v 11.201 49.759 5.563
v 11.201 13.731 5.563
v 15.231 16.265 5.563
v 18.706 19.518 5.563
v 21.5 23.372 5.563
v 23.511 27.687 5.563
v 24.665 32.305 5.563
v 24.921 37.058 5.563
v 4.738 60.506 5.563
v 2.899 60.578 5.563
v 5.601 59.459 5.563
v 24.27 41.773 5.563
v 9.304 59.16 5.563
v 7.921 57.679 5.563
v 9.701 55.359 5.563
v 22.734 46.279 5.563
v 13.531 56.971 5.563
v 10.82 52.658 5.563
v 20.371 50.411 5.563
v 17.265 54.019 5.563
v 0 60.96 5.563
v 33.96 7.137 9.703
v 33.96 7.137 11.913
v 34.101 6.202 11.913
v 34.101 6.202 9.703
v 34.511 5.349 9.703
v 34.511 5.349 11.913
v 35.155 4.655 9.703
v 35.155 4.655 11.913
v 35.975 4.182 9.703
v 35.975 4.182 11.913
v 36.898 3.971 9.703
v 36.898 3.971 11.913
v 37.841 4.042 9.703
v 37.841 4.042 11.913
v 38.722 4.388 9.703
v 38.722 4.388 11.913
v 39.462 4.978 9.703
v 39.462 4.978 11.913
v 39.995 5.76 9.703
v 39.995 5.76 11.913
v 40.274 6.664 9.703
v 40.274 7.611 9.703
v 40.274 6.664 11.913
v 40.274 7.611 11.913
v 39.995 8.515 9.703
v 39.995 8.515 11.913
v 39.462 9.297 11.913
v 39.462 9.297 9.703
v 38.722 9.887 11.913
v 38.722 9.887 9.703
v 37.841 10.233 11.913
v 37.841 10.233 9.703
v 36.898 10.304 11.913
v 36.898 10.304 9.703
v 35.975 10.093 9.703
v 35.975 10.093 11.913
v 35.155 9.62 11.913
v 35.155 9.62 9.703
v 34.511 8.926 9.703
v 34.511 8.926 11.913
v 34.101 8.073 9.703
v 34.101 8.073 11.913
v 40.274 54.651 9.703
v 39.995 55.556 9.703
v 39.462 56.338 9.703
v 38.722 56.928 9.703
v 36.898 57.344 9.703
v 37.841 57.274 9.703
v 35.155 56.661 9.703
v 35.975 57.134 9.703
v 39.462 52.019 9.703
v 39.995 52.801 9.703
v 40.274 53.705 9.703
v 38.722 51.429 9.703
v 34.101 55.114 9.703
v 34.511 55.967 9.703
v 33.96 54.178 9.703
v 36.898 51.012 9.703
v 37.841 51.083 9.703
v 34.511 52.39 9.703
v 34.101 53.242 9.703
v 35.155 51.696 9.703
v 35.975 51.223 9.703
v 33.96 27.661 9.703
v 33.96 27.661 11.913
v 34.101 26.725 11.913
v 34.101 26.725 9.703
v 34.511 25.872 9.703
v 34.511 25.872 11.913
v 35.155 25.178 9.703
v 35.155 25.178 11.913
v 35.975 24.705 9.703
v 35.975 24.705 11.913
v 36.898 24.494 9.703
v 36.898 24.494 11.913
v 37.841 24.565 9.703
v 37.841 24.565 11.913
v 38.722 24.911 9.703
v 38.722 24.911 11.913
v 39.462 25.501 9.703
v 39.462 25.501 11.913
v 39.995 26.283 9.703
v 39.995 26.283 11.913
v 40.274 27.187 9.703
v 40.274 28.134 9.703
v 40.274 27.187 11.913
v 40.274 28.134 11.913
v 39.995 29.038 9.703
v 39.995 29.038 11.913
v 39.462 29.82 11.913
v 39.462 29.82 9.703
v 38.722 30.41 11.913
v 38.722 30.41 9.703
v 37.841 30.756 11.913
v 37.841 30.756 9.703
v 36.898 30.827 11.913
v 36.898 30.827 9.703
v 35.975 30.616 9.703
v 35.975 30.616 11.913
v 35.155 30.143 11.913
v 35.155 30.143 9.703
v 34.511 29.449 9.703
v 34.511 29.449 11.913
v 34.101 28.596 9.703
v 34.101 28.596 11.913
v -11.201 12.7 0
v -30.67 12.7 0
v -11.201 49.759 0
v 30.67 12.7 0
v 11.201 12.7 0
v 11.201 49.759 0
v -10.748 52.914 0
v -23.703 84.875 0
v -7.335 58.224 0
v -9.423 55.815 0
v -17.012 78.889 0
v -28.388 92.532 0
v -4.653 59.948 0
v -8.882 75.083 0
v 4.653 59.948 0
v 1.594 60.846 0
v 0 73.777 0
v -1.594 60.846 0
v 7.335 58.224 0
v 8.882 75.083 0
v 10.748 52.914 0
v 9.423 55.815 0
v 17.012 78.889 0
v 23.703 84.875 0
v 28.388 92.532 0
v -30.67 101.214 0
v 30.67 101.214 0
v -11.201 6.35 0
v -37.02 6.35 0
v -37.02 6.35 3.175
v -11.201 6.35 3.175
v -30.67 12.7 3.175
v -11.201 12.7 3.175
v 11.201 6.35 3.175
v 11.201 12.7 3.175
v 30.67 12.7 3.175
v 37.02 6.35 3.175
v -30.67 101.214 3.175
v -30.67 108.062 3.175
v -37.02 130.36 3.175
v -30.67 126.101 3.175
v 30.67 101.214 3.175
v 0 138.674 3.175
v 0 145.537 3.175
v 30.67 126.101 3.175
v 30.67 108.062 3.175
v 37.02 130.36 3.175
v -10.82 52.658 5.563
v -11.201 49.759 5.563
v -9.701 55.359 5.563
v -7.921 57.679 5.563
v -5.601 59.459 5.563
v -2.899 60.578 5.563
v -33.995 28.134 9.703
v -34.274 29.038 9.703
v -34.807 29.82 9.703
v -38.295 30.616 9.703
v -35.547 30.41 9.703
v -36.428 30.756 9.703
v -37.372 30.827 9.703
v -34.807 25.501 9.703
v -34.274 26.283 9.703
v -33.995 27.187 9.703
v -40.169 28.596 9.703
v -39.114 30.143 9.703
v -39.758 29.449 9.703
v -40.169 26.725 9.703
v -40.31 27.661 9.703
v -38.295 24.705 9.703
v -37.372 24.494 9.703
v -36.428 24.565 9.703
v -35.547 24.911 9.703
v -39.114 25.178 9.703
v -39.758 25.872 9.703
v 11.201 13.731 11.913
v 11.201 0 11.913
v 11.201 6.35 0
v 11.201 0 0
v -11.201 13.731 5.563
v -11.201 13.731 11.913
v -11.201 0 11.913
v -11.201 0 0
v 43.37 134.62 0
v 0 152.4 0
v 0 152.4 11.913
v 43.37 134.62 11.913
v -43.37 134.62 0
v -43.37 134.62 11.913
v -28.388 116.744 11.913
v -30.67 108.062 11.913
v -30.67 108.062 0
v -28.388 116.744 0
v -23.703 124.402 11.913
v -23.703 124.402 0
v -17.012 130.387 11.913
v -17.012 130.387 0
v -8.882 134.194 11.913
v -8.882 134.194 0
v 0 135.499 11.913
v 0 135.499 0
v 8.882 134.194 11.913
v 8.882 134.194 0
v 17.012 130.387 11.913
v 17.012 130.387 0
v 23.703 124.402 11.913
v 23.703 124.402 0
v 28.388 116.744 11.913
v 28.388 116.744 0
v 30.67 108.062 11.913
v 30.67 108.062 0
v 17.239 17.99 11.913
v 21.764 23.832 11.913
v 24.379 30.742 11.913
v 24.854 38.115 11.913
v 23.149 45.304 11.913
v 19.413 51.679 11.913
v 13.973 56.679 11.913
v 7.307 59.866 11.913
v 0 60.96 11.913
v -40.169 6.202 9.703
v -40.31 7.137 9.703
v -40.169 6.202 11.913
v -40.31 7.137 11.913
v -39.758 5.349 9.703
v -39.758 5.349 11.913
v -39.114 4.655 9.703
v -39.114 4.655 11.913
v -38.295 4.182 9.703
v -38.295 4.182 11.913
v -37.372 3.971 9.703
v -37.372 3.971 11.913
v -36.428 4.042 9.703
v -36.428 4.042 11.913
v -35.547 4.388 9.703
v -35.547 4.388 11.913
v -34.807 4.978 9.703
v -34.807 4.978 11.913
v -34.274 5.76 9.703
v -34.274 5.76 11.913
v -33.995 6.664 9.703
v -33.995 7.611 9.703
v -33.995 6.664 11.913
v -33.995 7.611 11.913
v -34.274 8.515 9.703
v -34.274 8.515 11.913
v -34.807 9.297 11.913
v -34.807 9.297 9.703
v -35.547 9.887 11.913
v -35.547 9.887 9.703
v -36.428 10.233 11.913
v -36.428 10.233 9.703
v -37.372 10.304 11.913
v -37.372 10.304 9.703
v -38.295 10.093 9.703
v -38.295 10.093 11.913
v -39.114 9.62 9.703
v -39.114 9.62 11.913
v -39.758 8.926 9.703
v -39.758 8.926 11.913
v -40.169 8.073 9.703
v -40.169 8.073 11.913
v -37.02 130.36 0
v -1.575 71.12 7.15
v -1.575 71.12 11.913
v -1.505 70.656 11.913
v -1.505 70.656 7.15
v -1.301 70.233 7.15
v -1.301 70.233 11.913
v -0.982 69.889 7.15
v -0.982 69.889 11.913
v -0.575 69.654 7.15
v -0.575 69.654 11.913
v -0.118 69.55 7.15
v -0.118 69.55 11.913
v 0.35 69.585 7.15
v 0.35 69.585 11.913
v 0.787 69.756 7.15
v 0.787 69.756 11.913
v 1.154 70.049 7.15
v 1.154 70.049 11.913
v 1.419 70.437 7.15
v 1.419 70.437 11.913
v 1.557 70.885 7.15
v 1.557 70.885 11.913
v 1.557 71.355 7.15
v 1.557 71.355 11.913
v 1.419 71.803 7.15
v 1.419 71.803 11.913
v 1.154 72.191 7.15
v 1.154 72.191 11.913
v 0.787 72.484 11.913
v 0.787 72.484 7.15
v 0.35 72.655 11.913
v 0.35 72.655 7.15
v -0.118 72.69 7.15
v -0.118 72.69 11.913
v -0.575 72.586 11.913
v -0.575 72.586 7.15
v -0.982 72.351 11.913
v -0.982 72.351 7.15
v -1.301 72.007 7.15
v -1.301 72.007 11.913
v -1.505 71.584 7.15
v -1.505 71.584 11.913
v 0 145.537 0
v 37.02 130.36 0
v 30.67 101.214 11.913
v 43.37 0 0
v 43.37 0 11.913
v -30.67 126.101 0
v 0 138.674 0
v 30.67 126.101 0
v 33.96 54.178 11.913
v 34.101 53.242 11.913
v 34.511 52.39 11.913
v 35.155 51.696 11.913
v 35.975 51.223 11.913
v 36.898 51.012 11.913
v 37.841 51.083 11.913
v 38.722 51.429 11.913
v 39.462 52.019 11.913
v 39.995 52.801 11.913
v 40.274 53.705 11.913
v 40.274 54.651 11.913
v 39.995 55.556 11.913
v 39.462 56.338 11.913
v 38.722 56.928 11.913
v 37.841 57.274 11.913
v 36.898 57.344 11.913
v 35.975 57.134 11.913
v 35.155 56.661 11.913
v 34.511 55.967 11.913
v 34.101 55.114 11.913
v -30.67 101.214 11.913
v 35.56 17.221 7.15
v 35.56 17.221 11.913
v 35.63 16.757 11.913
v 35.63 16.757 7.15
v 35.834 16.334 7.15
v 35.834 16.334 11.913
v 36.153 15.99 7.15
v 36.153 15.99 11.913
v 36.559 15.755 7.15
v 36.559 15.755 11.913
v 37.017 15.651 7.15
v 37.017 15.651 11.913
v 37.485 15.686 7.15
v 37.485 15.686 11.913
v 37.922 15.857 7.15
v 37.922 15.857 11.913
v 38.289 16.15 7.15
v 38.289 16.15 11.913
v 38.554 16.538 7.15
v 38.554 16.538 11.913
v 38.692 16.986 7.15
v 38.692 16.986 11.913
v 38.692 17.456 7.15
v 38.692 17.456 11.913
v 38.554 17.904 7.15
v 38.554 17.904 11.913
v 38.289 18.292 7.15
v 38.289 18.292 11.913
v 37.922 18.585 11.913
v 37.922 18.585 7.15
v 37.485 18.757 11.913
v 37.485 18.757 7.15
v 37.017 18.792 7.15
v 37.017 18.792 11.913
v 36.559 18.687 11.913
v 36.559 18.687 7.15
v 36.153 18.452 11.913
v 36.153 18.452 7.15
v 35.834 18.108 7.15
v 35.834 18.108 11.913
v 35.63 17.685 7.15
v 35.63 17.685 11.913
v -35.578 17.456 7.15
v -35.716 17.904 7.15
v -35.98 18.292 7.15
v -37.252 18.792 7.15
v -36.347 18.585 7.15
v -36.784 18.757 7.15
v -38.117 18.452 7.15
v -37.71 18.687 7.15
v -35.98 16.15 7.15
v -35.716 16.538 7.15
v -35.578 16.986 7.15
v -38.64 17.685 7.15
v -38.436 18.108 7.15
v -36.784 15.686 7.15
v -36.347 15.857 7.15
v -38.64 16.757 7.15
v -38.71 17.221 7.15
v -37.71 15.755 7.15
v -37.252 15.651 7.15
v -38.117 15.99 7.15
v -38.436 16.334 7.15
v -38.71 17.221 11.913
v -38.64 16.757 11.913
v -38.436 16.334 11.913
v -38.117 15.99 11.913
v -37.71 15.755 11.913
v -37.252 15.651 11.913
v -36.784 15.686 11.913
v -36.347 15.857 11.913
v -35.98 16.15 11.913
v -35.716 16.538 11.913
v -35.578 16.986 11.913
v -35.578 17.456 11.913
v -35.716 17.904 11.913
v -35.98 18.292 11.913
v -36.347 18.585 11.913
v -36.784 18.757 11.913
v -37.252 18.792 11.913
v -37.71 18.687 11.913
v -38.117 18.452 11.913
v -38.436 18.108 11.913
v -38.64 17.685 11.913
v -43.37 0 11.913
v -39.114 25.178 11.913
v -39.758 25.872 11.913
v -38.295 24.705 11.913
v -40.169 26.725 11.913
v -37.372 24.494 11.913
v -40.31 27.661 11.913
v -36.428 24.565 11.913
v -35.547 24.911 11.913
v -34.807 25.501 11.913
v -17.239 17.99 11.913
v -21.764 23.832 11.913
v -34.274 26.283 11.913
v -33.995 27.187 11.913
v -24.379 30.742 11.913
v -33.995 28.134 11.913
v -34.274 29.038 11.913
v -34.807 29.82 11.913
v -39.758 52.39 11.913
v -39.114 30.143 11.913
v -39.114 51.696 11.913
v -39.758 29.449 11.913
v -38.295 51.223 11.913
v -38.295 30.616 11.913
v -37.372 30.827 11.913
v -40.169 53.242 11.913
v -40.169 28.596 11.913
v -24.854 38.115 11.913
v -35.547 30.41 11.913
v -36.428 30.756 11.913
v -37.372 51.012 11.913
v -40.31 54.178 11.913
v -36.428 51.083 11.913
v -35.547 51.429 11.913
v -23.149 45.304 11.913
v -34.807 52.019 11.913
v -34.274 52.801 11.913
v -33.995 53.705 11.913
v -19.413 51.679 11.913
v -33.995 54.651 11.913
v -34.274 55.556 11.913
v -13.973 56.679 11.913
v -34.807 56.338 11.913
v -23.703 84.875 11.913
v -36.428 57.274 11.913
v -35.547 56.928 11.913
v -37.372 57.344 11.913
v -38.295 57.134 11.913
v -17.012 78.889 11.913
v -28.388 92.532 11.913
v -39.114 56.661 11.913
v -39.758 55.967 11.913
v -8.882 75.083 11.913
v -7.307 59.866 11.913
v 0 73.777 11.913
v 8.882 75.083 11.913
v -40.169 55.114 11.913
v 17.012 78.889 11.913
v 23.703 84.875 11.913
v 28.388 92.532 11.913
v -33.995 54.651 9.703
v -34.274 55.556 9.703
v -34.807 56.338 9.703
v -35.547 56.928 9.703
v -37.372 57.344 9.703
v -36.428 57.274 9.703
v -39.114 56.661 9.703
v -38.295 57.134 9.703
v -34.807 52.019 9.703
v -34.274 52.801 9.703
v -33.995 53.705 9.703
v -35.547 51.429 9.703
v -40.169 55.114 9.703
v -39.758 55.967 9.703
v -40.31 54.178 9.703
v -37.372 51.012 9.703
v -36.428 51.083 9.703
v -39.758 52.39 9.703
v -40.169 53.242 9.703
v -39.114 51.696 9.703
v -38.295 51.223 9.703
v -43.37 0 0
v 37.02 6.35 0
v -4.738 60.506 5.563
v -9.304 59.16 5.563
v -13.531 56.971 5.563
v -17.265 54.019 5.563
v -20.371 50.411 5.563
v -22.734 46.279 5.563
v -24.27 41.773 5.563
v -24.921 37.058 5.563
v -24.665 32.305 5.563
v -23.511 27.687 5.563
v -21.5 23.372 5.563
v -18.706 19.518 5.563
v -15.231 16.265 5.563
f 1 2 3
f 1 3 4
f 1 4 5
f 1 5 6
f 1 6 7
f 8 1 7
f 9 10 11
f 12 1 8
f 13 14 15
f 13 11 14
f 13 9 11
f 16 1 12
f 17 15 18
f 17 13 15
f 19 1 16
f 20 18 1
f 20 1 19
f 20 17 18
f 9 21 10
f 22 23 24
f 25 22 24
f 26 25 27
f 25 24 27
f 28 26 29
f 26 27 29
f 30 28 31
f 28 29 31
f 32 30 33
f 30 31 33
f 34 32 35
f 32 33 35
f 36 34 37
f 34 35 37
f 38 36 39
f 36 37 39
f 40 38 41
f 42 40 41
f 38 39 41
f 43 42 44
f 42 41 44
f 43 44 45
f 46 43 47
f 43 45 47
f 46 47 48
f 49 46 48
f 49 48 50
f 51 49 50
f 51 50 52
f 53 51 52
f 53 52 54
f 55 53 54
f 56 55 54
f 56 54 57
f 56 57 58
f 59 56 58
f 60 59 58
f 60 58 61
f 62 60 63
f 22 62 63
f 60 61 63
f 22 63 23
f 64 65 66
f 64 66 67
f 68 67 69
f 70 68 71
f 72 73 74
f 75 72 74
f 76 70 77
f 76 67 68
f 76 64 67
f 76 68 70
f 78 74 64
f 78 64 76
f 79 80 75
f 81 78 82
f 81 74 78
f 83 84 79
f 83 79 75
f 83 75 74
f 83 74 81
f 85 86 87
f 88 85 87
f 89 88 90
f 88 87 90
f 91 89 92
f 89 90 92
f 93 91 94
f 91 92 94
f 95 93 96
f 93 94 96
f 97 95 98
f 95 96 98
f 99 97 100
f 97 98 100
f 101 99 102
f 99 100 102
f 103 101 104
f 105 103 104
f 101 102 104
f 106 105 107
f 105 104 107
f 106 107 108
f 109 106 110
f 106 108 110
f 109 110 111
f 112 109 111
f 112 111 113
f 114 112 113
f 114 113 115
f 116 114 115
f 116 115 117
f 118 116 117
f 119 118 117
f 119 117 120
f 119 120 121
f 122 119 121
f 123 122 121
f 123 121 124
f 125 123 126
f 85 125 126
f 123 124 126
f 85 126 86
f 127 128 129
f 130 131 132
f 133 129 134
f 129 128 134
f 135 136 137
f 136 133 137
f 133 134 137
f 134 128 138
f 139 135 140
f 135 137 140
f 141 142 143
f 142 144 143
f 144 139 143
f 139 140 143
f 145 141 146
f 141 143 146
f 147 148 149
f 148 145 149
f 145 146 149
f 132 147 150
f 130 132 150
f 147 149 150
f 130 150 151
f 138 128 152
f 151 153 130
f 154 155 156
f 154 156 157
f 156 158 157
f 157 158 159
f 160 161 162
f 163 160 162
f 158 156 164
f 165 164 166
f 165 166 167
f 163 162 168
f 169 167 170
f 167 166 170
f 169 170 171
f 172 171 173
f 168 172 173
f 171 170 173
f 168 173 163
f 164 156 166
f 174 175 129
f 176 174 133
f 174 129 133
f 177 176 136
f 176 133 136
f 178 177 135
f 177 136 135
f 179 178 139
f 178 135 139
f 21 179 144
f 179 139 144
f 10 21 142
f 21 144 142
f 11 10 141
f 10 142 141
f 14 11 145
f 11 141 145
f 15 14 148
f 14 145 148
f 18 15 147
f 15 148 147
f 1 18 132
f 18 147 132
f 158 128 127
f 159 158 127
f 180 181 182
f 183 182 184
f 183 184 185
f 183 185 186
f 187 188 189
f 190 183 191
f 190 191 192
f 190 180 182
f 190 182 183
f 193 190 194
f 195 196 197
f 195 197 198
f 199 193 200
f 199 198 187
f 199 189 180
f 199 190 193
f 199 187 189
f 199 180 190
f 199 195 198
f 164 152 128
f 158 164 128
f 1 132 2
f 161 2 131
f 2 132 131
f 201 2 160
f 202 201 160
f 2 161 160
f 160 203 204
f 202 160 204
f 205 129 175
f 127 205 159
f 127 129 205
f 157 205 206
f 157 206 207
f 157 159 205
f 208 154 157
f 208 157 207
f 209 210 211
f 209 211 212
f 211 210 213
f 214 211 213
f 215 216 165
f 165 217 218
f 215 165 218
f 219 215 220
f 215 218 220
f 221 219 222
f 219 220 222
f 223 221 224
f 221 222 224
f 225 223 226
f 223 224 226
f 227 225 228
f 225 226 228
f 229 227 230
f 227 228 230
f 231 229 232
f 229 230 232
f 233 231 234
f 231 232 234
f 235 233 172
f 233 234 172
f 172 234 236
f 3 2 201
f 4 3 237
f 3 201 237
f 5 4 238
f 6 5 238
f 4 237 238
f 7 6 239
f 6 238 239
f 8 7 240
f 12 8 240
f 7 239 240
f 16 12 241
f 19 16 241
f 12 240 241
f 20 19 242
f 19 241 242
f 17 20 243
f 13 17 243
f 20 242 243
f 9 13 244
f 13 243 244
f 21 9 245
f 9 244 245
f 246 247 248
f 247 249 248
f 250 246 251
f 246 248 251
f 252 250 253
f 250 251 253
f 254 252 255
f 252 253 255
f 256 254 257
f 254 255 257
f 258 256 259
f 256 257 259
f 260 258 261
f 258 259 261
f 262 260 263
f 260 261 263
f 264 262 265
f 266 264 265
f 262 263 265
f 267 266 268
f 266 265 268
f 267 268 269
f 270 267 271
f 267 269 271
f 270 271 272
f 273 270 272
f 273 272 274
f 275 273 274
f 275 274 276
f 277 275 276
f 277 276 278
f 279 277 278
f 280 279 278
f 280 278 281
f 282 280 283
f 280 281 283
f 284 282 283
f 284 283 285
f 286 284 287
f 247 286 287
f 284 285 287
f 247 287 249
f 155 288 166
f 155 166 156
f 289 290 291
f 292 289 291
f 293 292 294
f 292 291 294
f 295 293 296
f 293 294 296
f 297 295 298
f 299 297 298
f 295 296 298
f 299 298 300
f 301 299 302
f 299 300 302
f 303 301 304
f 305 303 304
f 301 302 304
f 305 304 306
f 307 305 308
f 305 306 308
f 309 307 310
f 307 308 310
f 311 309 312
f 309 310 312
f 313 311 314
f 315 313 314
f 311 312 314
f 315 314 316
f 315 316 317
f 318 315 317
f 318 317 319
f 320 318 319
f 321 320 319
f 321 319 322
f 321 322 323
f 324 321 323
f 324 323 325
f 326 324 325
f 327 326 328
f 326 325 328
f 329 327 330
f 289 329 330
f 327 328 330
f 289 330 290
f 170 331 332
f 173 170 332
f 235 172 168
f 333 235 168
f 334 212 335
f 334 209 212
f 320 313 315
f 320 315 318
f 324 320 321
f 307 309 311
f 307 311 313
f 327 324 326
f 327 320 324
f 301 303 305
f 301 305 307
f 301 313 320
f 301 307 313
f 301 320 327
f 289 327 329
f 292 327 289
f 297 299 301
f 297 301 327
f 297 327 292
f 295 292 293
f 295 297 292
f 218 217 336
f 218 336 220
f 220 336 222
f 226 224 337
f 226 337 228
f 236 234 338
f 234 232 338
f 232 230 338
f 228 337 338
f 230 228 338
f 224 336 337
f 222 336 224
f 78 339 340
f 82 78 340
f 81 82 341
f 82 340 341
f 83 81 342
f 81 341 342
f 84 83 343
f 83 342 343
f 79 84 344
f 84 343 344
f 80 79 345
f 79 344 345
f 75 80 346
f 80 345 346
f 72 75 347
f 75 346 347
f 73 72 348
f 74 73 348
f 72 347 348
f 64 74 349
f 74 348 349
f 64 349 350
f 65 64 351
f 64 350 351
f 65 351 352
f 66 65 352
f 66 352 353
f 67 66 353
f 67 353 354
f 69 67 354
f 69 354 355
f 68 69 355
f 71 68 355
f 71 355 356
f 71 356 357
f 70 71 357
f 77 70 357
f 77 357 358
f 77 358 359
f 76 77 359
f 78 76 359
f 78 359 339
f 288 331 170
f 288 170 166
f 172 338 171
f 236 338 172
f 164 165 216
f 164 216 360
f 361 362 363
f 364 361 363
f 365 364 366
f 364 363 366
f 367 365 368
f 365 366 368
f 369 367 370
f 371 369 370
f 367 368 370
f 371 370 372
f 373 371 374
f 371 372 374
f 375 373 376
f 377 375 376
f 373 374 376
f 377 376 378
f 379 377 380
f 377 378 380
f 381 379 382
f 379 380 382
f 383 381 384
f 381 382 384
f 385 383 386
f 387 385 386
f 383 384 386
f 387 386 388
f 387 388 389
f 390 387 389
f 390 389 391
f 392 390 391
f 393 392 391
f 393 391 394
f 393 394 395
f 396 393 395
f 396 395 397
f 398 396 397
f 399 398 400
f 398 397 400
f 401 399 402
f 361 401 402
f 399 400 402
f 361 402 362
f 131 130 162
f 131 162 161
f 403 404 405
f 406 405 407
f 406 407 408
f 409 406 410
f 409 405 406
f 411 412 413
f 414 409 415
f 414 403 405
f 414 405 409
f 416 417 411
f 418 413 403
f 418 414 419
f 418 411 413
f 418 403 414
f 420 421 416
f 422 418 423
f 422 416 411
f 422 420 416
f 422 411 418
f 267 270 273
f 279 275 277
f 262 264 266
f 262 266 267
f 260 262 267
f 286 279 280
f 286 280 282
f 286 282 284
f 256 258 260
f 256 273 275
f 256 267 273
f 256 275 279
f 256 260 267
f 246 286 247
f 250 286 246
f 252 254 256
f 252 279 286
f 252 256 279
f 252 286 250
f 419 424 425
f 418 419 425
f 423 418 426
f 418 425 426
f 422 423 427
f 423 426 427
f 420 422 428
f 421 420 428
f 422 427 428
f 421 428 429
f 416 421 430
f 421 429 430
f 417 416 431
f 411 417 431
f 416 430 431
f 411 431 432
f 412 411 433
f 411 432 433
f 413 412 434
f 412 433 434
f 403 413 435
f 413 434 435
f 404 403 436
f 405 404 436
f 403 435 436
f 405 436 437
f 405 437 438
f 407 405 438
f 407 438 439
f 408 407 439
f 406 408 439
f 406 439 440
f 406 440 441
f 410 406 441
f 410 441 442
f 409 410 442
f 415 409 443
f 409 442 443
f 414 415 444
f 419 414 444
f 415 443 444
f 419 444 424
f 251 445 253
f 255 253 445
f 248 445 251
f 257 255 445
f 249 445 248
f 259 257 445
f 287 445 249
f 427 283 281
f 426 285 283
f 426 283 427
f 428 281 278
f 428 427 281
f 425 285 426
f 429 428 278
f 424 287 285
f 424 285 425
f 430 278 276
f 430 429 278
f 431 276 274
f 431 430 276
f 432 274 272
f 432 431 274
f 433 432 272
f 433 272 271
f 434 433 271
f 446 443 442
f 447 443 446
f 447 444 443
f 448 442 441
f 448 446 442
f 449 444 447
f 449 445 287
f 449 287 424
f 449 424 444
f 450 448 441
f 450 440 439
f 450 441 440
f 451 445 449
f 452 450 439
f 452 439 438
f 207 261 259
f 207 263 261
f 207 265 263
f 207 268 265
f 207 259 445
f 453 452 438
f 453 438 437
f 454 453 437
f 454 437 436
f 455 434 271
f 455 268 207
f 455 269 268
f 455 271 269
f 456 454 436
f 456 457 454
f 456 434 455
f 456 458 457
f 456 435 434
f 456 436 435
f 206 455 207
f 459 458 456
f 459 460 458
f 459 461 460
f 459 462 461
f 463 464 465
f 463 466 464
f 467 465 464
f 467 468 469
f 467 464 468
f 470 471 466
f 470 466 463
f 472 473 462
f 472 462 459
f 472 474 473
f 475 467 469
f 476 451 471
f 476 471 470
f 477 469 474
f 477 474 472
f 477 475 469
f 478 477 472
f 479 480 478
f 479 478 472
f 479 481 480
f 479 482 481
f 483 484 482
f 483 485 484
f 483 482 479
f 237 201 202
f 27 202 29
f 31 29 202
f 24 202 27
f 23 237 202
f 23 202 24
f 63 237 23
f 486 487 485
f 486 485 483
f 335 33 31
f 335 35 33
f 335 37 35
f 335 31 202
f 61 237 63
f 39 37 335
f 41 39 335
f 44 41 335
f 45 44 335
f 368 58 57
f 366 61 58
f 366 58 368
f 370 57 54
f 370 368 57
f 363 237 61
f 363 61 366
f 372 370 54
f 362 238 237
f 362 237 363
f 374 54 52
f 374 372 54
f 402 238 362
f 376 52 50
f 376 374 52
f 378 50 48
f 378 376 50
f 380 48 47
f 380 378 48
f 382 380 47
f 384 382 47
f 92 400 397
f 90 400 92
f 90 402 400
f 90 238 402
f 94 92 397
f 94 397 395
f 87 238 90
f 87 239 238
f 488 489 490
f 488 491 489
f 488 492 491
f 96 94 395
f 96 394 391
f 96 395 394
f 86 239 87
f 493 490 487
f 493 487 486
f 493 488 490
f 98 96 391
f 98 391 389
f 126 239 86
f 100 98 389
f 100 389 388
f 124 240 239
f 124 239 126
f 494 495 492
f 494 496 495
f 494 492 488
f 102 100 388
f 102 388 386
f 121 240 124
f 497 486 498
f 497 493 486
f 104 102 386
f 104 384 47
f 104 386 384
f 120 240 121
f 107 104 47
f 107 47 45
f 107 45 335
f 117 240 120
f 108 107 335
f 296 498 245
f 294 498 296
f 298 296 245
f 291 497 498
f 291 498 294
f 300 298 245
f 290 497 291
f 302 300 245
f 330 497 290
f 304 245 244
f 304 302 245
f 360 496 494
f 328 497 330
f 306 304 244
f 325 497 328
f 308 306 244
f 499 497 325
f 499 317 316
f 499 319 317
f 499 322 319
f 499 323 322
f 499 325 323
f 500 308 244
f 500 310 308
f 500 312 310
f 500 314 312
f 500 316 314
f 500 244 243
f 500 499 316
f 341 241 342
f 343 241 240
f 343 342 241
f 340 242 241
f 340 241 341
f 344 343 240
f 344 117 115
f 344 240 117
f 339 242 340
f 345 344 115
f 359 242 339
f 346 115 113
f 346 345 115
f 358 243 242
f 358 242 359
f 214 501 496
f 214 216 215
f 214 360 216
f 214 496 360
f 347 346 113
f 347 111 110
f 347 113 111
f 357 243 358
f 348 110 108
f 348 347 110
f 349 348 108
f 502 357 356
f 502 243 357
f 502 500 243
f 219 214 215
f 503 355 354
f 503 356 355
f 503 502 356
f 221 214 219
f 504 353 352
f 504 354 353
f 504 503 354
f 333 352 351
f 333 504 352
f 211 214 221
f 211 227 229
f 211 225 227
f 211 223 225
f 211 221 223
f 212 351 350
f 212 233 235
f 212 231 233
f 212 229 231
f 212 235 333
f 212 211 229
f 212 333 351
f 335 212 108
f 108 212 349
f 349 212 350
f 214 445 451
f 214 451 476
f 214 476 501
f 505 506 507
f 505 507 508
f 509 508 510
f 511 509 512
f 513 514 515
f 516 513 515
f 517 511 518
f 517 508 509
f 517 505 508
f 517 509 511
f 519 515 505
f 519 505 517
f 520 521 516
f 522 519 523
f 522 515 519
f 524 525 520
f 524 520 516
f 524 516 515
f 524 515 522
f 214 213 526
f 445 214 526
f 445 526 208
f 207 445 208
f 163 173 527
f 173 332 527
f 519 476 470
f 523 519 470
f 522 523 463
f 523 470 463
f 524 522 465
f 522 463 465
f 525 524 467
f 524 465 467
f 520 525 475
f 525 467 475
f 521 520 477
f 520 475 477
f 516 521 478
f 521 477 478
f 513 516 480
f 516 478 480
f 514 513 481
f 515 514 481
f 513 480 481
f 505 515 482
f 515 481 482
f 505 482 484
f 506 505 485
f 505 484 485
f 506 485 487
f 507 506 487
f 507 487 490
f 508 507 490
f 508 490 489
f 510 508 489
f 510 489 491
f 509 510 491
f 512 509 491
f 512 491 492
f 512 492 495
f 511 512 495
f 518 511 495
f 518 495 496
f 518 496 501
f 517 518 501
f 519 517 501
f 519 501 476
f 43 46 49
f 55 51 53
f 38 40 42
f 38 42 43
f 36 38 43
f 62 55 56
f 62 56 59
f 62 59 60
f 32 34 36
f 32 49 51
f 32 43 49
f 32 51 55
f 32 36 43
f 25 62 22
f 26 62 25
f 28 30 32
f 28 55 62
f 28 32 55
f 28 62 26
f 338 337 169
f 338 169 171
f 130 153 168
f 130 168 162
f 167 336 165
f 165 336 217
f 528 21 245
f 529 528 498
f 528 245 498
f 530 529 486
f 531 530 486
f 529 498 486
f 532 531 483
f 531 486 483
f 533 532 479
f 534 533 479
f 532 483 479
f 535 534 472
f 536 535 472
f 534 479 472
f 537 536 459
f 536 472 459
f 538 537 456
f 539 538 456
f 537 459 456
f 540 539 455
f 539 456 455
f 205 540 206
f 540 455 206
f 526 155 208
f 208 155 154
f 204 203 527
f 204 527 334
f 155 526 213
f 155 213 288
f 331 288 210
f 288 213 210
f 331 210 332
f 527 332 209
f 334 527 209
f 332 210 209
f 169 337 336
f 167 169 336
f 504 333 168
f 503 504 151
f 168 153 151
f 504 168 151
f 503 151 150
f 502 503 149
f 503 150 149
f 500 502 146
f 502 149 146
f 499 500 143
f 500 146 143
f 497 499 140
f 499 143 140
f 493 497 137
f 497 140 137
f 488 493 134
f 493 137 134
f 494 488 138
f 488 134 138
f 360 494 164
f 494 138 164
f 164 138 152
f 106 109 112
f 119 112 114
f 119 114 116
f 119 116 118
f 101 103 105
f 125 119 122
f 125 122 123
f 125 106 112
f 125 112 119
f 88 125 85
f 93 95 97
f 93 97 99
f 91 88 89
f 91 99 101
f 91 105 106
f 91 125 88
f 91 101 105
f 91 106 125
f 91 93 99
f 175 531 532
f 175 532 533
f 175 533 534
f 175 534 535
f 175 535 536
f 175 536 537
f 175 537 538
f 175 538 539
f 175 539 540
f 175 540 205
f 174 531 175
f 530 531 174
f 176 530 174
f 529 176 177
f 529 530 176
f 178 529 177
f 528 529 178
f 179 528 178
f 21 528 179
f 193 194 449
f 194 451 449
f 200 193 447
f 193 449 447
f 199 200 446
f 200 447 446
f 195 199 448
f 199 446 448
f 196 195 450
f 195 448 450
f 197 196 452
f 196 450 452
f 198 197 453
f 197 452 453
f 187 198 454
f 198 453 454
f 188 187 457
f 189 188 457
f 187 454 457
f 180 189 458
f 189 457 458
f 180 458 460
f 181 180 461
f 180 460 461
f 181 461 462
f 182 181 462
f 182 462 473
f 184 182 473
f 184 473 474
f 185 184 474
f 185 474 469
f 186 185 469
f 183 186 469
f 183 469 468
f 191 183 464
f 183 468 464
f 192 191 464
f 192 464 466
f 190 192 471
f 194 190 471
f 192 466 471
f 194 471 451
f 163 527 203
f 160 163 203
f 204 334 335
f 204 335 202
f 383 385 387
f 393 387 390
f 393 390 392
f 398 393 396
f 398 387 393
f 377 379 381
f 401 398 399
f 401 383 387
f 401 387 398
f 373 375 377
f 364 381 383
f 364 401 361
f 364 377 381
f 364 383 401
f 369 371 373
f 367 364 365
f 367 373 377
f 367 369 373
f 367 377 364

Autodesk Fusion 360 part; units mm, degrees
sketch "Sketch1" plane through (0, 0, 0) normal (0, 0, 1) x (1, 0, 0)
  line L0 (0, 0) -> (0, 152.4) construction
  line L1 (0, 152.4) -> (-43.3705, 134.62)
  line L2 (-43.3705, 134.62) -> (-43.3705, 0)
  line L3 (-43.3705, 0) -> (0, 0)
  line L4 (-11.2014, 49.7586) -> (-11.2014, 0)
  arc A0 (0, 60.96) -> (-11.2014, 49.7586) centre (0, 49.7586) ccw
  arc A1 (0, 60.96) -> (-11.2014, 13.7311) centre (0, 36.0172) ccw
  line L5 (0, 145.5371) -> (-37.0205, 130.3603)
  line L6 (-37.0205, 130.3603) -> (-37.0205, 6.35)
  line L7 (-37.0205, 6.35) -> (-11.2014, 6.35)
  line L8 (0, 138.6742) -> (-30.6705, 126.1007)
  line L9 (-30.6705, 126.1007) -> (-30.6705, 12.7)
  line L10 (-30.6705, 12.7) -> (-11.2014, 12.7)
  line L11 (30.6705, 12.7) -> (11.2014, 12.7)
  line L12 (37.0205, 130.3603) -> (37.0205, 6.35)
  line L13 (0, 145.5371) -> (37.0205, 130.3603)
  line L14 (0, 138.6742) -> (30.6705, 126.1007)
  line L15 (37.0205, 6.35) -> (11.2014, 6.35)
  arc A2 (11.2014, 49.7586) -> (0, 60.96) centre (0, 49.7586) ccw
  line L16 (11.2014, 49.7586) -> (11.2014, 0)
  line L17 (43.3705, 134.62) -> (43.3705, 0)
  line L18 (30.6705, 126.1007) -> (30.6705, 12.7)
  arc A3 (11.2014, 13.7311) -> (0, 60.96) centre (0, 36.0172) ccw
  line L19 (43.3705, 0) -> (0, 0)
  line L20 (0, 152.4) -> (43.3705, 134.62)
  circle A4 centre (0, 104.6382) radius 30.861
  point P0 (0, 60.96)
  point P1 (0, 60.96)
  point P2 (0, 135.4992)
  dimension "d1" = 152.4
  dimension "d2" = 43.3705
  dimension "d3" = 134.62
  dimension "d4" = 49.8856
  dimension "d5" = 22.4028
  dimension "d6" = 60.96
  dimension "d9" = 6.35
  dimension "d10" = 6.35
  dimension "d11" = 6.35
  dimension "d12" = 6.35
  dimension "d13" = 6.35
  dimension "d14" = 6.35
  dimension "d22" = 61.722
  dimension "d23" = 3.175
extrude "Extrude1" add sketch "Sketch1" along normal blind 11.9126 contours L1 L2 L3 L4 L5 L6 L7 L12 L13 L15 L16 L17 L19 L20 | L4 L5 L6 L7 L8 L9 L10 L11 L12 L13 L14 L15 L16 L18 A4 | L4 A1 L9 L10 L11 L16 L18 A3 A4 | L4 A0 A1 | A2 L16 A3 | L9 A4 | L18 A4 | L8 L9 L14 L18 A4
extrude "Extrude2" cut sketch "Sketch1" against normal blind 6.35 from surface at 11.9126 contours L4 A0 A1 | A2 L16 A3
extrude "Extrude3" cut sketch "Sketch1" along normal blind 3.175 contours L4 L5 L6 L7 L8 L9 L10 L11 L12 L13 L14 L15 L16 L18 A4 | L9 A4 | L18 A4
sketch "Sketch2" plane through (0, 0, 11.9126) normal (0, 0, 1) x (-1, 0, 0)
  line L0 (30.6705, -101.2145) -> (30.6705, -108.0619)
  arc A0 (-30.6705, -108.0619) -> (30.6705, -108.0619) centre (0, -104.6382) ccw
  line L1 (-30.6705, -108.0619) -> (-30.6705, -101.2145)
  arc A1 (30.6705, -101.2145) -> (-30.6705, -101.2145) centre (0, -104.6382) ccw
  arc A2 (-11.2014, -13.7311) -> (11.2014, -13.7311) centre (0, -36.0172) ccw
  line L2 (-11.2014, -13.7311) -> (-11.2014, 0)
  line L3 (-11.2014, 0) -> (-43.3705, 0)
  line L4 (-43.3705, 0) -> (-43.3705, -134.62)
  line L5 (-43.3705, -134.62) -> (0, -152.4)
  line L6 (0, -152.4) -> (43.3705, -134.62)
  line L7 (43.3705, -134.62) -> (43.3705, 0)
  line L8 (43.3705, 0) -> (11.2014, 0)
  line L9 (11.2014, 0) -> (11.2014, -13.7311)
  line L10 (0, -152.4) -> (0, 0) construction
  circle A3 centre (0, -71.12) radius 1.5748
  line L11 (37.1348, -17.2212) -> (-37.1348, -17.2212) construction
  circle A4 centre (37.1348, -17.2212) radius 1.5748
  circle A5 centre (-37.1348, -17.2212) radius 1.5748
  point P0 (0, -17.2212)
  dimension "d24" = 3.1496
  dimension "d25" = 74.2696
  dimension "d26" = 3.1496
  dimension "d27" = 3.1496
  dimension "d28" = 17.2212
  dimension "d30" = 71.12
extrude "Extrude4" cut sketch "Sketch2" against normal blind 4.7625 contours A3 | A4 | A5
sketch "Sketch3" plane through (0, 0, 11.9126) normal (0, 0, 1) x (-1, 0, 0)
  circle A0 centre (0, -71.12) radius 1.5748
  circle A1 centre (-37.1348, -17.2212) radius 1.5748
  circle A2 centre (37.1348, -17.2212) radius 1.5748
  line L0 (30.6705, -101.2145) -> (30.6705, -108.0619)
  arc A3 (-30.6705, -108.0619) -> (30.6705, -108.0619) centre (0, -104.6382) ccw
  line L1 (-30.6705, -108.0619) -> (-30.6705, -101.2145)
  arc A4 (30.6705, -101.2145) -> (-30.6705, -101.2145) centre (0, -104.6382) ccw
  arc A5 (-11.2014, -13.7311) -> (11.2014, -13.7311) centre (0, -36.0172) ccw
  line L2 (-11.2014, -13.7311) -> (-11.2014, 0)
  line L3 (-11.2014, 0) -> (-43.3705, 0)
  line L4 (-43.3705, 0) -> (-43.3705, -134.62)
  line L5 (-43.3705, -134.62) -> (0, -152.4)
  line L6 (0, -152.4) -> (43.3705, -134.62)
  line L7 (43.3705, -134.62) -> (43.3705, 0)
  line L8 (43.3705, 0) -> (11.2014, 0)
  line L9 (11.2014, 0) -> (11.2014, -13.7311)
  line L10 (37.1348, 0) -> (37.1348, -137.1764) construction
  circle A6 centre (37.1348, -7.1374) radius 3.175
  circle A7 centre (37.1348, -27.6606) radius 3.175
  circle A8 centre (37.1348, -54.1782) radius 3.175
  line L11 (0, -152.4) -> (0, 0) construction
  circle A9 centre (-37.1348, -27.6606) radius 3.175
  circle A10 centre (-37.1348, -54.1782) radius 3.175
  circle A11 centre (-37.1348, -7.1374) radius 3.175
  dimension "d33" = 6.35
  dimension "d34" = 6.35
  dimension "d35" = 6.35
  dimension "d36" = 7.1374
  dimension "d37" = 20.5232
  dimension "d38" = 26.5176
extrude "Extrude5" cut sketch "Sketch3" against normal blind 2.2098 contours A6 | A7 | A8 | A9 | A10 | A11
equation "d2 = 3.415 in / 2"
equation "d25 = 3.048 in - 0.124 in"
equation "d31 = ( -3 / 16 ) * 1 in"
